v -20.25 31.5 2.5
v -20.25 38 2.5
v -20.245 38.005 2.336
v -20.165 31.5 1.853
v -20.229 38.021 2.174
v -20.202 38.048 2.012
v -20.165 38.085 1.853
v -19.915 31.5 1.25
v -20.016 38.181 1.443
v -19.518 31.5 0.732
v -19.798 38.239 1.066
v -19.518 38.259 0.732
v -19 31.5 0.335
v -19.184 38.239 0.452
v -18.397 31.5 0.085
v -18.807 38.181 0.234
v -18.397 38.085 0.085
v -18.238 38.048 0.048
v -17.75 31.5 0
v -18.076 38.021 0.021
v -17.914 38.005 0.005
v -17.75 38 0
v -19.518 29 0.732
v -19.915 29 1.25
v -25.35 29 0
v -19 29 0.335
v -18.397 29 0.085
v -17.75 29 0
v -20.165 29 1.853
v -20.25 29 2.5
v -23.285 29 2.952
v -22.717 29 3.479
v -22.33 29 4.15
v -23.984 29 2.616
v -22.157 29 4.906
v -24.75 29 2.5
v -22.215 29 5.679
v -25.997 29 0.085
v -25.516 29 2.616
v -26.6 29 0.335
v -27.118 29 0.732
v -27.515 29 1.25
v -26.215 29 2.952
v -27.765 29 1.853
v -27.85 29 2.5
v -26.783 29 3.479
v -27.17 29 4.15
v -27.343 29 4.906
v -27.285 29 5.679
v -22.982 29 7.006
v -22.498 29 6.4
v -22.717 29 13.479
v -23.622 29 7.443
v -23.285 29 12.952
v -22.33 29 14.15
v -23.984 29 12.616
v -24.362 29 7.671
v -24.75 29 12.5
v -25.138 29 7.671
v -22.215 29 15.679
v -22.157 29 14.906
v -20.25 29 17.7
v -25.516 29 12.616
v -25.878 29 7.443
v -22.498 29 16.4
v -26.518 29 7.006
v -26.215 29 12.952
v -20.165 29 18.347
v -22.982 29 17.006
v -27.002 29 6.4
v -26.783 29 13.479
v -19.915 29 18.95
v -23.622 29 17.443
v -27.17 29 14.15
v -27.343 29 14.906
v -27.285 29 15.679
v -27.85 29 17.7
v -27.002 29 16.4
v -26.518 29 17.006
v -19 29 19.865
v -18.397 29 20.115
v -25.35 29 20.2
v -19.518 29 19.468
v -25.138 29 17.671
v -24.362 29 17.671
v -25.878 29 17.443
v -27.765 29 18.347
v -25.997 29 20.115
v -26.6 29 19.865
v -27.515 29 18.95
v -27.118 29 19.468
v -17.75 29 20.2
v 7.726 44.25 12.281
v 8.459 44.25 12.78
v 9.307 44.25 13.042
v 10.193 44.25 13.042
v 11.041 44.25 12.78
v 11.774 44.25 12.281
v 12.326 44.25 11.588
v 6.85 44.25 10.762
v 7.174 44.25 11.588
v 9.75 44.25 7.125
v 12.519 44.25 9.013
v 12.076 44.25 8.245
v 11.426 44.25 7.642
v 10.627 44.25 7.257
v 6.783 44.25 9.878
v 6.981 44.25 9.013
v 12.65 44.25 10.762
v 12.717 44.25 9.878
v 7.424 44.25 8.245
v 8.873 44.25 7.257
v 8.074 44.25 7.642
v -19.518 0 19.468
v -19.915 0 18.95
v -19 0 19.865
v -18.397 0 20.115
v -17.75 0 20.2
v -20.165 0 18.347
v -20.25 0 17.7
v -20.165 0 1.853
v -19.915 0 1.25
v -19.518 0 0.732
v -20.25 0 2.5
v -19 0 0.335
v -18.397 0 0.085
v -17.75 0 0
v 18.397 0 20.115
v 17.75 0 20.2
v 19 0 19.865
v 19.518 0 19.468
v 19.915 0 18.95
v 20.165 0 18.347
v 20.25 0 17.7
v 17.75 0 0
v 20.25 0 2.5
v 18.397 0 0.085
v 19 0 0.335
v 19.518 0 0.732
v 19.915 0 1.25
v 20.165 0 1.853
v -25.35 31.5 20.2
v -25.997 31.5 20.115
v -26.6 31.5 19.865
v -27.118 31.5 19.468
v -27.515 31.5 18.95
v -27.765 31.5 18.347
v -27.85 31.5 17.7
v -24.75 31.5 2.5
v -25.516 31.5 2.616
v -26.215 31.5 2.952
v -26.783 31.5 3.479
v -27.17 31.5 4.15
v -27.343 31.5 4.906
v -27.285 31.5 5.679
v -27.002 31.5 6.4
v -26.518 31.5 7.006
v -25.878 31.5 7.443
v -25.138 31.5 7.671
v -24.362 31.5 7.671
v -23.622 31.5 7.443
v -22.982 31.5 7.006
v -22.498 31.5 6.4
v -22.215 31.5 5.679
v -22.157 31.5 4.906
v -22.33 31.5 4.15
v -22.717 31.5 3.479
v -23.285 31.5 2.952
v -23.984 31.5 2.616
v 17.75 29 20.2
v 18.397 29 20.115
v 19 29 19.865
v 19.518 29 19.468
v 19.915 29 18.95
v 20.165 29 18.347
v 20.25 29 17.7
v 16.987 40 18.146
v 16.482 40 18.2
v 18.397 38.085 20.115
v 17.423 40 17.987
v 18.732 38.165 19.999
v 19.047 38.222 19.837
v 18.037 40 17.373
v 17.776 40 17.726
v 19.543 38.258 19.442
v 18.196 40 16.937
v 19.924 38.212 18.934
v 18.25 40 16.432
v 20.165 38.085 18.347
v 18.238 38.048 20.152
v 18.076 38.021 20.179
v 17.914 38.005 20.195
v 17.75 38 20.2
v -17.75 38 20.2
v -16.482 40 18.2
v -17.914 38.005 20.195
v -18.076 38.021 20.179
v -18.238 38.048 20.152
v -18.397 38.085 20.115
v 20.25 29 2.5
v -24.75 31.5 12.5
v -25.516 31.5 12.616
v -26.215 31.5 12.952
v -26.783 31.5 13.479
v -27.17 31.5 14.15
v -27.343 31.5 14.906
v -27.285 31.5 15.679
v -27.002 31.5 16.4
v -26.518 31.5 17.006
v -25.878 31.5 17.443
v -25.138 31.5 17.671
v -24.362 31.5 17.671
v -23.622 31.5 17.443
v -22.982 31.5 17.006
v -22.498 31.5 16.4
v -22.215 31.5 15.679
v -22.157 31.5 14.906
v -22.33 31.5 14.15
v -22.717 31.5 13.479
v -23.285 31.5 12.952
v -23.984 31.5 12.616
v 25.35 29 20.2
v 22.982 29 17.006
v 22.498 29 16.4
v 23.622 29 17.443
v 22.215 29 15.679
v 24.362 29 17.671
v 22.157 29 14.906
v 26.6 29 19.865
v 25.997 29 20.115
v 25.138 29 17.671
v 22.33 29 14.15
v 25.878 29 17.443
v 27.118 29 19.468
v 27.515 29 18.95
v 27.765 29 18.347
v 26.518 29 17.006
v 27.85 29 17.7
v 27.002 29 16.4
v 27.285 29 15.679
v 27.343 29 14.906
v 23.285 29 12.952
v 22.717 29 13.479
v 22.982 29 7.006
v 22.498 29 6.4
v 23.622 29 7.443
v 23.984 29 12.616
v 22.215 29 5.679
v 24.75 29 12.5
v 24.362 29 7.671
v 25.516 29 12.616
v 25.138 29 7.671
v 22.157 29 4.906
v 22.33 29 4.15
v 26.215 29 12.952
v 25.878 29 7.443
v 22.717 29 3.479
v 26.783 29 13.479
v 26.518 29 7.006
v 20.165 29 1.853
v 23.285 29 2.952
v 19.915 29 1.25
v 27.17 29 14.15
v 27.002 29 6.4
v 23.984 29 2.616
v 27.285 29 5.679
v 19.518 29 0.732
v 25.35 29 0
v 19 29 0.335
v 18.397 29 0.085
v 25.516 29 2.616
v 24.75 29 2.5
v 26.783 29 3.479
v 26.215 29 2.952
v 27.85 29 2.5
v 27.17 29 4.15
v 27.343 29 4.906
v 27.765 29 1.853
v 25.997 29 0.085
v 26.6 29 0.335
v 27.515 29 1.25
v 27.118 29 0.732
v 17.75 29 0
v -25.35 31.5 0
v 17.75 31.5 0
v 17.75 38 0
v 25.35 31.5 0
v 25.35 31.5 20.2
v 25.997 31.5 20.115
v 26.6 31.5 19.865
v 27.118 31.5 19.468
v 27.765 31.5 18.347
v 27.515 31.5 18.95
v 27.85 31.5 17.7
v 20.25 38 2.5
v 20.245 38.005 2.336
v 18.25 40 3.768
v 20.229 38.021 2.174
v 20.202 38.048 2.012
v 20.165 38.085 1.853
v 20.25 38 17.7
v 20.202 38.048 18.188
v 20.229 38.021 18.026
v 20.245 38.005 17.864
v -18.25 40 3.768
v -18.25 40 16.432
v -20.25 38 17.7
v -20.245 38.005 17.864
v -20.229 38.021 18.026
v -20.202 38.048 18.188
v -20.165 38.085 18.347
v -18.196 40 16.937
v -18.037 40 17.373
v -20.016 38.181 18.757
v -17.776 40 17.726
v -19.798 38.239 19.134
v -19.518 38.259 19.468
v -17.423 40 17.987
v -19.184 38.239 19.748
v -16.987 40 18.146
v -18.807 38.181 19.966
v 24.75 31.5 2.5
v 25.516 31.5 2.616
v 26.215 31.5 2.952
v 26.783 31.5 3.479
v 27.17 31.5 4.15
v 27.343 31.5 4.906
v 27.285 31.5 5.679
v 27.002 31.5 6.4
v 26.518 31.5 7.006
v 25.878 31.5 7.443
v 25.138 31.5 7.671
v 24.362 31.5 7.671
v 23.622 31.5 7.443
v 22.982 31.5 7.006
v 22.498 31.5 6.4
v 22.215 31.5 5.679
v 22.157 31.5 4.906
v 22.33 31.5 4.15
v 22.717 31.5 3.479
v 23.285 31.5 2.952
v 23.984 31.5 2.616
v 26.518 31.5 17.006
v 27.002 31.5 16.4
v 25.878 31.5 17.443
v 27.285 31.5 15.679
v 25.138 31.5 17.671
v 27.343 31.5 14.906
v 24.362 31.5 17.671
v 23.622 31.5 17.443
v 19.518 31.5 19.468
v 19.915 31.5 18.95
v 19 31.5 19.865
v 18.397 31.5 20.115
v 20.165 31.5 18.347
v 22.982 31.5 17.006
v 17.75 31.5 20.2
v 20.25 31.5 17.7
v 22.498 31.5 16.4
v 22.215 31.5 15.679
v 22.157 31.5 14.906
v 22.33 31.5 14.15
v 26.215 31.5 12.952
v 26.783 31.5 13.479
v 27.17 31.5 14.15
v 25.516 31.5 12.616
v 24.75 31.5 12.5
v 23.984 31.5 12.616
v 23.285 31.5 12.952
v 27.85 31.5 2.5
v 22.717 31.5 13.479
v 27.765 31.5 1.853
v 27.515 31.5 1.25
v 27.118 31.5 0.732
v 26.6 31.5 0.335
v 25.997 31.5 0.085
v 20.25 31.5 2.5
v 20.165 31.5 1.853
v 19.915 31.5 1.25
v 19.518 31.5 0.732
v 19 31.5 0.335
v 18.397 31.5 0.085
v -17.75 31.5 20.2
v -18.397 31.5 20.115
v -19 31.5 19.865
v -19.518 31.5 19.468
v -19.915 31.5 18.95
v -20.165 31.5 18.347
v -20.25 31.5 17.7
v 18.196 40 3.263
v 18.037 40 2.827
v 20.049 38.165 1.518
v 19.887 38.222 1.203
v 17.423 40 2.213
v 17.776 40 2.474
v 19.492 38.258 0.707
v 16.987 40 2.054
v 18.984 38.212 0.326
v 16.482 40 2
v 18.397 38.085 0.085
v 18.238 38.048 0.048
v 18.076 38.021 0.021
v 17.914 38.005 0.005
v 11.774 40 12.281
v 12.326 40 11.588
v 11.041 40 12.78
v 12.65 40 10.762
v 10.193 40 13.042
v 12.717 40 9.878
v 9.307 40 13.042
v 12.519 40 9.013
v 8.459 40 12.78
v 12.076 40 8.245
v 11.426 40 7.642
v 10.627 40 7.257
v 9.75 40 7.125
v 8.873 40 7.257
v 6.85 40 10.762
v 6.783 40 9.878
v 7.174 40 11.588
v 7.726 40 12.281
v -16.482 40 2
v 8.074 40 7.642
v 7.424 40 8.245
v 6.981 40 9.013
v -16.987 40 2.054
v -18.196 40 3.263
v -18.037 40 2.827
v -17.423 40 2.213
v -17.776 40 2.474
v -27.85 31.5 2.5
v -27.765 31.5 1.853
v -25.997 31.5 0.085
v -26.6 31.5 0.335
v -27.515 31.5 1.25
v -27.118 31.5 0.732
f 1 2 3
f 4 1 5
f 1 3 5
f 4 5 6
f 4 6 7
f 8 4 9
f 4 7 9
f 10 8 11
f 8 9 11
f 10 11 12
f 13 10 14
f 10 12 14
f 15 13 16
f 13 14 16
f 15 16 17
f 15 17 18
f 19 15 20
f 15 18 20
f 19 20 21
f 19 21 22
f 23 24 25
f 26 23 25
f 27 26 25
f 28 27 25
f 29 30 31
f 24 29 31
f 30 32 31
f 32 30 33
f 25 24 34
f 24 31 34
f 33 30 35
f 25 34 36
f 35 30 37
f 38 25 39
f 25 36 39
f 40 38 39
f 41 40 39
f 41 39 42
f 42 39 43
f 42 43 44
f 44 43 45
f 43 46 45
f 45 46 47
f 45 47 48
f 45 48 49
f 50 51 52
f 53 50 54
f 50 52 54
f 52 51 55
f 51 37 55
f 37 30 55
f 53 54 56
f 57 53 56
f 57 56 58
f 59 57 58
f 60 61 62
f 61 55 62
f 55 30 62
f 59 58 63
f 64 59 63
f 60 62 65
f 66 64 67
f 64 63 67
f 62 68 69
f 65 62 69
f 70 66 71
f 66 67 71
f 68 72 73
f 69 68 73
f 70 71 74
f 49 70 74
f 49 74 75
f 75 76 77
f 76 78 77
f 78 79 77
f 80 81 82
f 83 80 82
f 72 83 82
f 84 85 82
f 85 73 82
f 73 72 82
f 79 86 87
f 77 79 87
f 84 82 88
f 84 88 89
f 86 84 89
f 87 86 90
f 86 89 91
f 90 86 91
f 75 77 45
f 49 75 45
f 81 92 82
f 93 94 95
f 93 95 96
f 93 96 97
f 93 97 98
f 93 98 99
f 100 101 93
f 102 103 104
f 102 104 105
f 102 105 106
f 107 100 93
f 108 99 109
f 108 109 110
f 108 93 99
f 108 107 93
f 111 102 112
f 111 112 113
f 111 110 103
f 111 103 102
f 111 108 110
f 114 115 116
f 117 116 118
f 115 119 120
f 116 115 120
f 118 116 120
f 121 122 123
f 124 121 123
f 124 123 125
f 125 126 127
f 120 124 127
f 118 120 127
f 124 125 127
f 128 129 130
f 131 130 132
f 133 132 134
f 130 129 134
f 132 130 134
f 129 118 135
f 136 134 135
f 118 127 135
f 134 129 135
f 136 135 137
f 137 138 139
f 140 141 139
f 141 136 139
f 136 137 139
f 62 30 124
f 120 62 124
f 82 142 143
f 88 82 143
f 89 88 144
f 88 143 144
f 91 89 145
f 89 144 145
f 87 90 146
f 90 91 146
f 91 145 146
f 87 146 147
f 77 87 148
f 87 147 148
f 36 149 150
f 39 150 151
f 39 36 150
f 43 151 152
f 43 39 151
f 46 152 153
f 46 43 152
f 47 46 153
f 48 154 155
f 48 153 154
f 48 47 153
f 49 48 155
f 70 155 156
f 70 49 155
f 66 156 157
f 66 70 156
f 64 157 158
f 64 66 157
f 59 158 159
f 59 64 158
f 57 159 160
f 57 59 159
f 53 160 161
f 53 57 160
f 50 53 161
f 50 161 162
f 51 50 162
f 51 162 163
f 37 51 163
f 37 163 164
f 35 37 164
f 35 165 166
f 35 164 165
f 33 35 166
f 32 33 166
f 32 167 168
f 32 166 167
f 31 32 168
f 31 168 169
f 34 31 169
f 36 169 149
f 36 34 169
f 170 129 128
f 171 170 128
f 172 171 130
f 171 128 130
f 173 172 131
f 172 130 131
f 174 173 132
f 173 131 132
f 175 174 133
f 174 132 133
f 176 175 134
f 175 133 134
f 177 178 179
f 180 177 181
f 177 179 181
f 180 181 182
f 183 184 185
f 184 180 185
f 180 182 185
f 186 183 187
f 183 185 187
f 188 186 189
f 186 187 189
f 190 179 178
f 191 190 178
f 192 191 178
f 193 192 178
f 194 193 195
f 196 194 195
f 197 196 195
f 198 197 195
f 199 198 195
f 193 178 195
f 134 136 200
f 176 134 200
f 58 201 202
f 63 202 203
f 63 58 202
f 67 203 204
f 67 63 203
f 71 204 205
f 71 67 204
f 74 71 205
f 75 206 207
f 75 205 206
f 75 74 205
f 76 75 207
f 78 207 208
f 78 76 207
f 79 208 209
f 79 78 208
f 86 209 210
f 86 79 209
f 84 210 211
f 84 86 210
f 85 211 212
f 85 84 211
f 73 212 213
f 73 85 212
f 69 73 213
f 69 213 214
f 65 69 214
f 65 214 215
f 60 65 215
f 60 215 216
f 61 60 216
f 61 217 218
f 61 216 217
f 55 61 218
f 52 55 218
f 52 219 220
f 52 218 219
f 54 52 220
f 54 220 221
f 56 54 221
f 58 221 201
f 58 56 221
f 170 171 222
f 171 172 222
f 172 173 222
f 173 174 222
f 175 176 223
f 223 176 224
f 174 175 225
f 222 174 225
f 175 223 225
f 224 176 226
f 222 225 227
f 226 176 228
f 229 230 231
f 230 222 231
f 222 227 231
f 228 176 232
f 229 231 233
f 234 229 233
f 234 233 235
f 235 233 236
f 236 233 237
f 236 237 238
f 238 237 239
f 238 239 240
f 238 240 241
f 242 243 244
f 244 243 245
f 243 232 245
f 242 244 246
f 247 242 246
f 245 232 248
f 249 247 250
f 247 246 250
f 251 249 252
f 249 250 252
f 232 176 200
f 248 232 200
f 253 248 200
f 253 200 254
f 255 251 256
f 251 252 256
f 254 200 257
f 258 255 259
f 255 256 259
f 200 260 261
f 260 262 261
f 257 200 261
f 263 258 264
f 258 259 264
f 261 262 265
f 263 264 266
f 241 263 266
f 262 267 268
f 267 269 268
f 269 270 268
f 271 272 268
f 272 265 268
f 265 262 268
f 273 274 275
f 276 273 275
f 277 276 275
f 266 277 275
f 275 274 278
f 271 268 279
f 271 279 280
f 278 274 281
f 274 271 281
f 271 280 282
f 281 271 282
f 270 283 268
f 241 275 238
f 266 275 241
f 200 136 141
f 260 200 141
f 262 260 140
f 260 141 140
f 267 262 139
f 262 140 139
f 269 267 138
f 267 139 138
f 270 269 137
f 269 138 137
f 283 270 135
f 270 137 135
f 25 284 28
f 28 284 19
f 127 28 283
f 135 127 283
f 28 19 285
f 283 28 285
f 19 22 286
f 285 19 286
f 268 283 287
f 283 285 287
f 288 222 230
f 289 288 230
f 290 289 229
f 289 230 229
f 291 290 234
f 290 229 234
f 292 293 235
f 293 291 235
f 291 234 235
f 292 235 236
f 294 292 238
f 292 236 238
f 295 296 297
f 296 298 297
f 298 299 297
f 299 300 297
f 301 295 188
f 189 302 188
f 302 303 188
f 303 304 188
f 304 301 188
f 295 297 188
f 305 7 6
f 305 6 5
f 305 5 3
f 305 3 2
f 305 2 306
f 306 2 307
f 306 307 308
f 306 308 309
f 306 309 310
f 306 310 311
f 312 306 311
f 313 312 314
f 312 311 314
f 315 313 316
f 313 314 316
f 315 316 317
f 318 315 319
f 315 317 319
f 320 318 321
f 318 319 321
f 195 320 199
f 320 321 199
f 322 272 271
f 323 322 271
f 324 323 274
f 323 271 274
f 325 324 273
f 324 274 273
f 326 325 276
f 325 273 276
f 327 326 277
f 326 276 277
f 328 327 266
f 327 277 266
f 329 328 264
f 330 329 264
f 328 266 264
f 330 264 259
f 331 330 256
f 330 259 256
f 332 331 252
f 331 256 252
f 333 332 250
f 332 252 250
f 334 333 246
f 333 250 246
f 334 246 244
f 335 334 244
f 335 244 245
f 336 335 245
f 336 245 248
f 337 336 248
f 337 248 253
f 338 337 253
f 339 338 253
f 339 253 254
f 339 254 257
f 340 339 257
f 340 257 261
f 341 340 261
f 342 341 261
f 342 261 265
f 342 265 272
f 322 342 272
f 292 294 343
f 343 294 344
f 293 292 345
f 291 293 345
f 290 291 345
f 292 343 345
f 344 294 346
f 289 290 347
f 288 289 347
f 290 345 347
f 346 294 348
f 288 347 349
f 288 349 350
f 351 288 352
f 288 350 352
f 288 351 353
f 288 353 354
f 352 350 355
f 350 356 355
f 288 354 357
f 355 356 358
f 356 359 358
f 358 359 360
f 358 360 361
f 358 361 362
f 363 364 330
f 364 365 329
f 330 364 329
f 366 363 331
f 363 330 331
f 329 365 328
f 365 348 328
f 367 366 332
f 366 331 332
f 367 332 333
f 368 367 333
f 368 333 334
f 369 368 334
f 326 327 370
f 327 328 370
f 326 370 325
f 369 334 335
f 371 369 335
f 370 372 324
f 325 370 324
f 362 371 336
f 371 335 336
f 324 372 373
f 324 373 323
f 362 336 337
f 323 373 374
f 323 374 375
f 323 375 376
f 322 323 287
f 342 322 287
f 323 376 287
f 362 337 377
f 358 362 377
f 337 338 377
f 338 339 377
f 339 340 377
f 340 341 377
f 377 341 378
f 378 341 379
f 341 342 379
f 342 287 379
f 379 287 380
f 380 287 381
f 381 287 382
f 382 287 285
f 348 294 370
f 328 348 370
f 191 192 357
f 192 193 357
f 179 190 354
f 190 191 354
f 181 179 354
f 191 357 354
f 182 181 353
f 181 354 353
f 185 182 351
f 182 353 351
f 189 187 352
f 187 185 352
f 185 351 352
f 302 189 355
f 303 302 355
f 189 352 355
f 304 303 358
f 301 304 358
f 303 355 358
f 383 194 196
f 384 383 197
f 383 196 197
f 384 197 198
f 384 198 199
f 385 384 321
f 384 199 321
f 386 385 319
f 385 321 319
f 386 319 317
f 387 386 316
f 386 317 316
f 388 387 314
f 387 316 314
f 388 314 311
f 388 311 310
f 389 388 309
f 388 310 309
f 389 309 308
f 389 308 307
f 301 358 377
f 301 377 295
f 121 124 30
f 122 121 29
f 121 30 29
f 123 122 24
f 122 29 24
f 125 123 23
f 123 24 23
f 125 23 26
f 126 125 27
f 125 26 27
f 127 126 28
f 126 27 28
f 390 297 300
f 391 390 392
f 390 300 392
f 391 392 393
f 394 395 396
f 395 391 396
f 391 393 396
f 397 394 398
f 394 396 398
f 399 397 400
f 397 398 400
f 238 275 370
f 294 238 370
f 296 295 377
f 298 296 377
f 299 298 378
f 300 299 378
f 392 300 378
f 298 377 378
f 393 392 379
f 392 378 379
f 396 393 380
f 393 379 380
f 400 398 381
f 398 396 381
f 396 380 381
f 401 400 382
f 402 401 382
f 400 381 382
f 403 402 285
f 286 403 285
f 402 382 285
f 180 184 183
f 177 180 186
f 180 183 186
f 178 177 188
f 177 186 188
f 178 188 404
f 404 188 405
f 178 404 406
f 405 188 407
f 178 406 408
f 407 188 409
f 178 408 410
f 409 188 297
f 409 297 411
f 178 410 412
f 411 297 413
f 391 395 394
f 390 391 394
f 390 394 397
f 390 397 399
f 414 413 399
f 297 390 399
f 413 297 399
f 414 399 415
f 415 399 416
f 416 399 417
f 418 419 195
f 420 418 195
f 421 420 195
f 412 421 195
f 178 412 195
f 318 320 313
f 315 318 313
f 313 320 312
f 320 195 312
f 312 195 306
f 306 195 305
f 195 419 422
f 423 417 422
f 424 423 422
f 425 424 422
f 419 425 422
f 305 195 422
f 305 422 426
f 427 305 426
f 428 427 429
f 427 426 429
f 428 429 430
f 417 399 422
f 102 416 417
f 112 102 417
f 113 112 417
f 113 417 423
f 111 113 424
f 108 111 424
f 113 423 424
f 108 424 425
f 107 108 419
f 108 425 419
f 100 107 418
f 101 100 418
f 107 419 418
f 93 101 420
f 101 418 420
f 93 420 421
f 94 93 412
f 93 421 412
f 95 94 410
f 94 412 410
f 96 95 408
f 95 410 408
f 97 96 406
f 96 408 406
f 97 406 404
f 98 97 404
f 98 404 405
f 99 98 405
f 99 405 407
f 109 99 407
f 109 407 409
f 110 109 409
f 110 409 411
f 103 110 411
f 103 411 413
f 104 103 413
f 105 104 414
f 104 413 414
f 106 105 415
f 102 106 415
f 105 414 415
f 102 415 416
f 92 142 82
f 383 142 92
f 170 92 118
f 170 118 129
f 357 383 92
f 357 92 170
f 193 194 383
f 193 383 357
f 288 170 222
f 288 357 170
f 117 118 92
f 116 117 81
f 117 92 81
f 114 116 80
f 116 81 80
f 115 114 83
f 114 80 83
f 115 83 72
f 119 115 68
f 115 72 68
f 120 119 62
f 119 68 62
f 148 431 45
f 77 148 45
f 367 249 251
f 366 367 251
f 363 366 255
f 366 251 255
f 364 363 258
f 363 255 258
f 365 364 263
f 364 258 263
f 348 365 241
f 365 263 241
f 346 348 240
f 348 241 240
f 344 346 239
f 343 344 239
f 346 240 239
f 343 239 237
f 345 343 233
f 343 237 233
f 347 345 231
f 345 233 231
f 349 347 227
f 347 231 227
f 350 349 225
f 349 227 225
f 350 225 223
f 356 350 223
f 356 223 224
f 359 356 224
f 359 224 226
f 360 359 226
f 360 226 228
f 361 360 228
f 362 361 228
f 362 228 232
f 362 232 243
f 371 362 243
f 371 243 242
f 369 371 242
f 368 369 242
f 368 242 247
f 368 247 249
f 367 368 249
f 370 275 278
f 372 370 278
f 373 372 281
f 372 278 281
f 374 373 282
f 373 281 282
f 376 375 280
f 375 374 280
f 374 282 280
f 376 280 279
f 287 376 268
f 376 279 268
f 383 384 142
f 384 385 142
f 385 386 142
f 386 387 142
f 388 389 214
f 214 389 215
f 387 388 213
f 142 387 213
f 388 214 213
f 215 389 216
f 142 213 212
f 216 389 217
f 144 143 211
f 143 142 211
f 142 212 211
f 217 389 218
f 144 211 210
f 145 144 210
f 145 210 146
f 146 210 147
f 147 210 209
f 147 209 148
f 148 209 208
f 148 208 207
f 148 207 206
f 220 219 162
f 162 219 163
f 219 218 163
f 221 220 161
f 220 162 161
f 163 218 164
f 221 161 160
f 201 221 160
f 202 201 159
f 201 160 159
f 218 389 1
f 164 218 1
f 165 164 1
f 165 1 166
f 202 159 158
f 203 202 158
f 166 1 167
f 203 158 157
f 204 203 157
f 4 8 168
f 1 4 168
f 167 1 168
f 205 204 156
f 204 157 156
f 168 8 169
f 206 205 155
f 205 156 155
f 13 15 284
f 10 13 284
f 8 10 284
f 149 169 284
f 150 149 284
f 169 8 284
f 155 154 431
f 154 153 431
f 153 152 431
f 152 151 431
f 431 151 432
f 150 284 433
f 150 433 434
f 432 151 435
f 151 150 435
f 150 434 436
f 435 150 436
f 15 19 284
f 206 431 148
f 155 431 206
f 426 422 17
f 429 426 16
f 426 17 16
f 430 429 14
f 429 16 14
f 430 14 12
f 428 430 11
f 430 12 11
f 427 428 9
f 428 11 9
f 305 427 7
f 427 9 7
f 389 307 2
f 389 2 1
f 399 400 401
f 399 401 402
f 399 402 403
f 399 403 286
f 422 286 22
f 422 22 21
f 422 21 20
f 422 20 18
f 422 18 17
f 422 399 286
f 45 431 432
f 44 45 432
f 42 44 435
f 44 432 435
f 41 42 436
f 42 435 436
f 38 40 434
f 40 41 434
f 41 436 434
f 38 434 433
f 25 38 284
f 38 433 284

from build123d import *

# Parameters (mm, degrees)
BOSS_EXTRUDE1_DEPTH = 20.2
SKETCH2_R           = 2.975
BOSS_EXTRUDE2_DEPTH = 4.25
CUT_EXTRUDE1_START  = 29
SKETCH3_R           = 2.6
CUT_EXTRUDE1_DEPTH  = 4.25
CHAMFER1_SIZE       = 2
FILLET1_R           = 2.5


with BuildPart() as part:
    # Sketch1 → Boss-Extrude1 (new body)
    with BuildSketch(Plane.XY):
        Polygon((-20.25, 0), (20.25, 0), (20.25, 29), (27.85, 29), (27.85, 31.5), (20.25, 31.5), (20.25, 40), (-20.25, 40), (-20.25, 31.5), (-27.85, 31.5), (-27.85, 29), (-20.25, 29), align=None)
    extrude(amount=BOSS_EXTRUDE1_DEPTH)

    # Sketch2 → Boss-Extrude2 (add)
    with BuildSketch(Plane(origin=(0, 40, 0), x_dir=(1, 0, 0), z_dir=(0, 1, 0))):
        with Locations(Location((9.75, -10.1, 0), (0, 0, 90))):
            Circle(SKETCH2_R)
    extrude(amount=BOSS_EXTRUDE2_DEPTH)

    # Sketch3 → Cut-Extrude1 (cut)
    with BuildSketch(Plane(origin=(0, 0, 0), x_dir=(1, 0, 0), z_dir=(0, 1, 0)).offset(CUT_EXTRUDE1_START)):
        with Locations(Location((-24.75, -5.1, 0), (0, 0, 90))):
            Circle(SKETCH3_R)
        with Locations(Location((-24.75, -15.1, 0), (0, 0, 90))):
            Circle(SKETCH3_R)
    cut_extrude1 = extrude(amount=CUT_EXTRUDE1_DEPTH, mode=Mode.SUBTRACT)

    # Mirror1: Cut-Extrude1 across plane
    add(cut_extrude1.mirror(Plane(origin=(0, 0, 0), x_dir=(0, 0, 1), z_dir=(1, 0, 0))), mode=Mode.SUBTRACT)

    # Chamfer1
    chamfer1_edges = [part.edges().sort_by_distance(p)[0] for p in [
        (0, 40, 0),
        (0, 40, 20.2),
        (-20.25, 40, 10.1),
        (20.25, 40, 10.1),
    ]]
    chamfer(chamfer1_edges, length=CHAMFER1_SIZE)

    # Fillet1
    # the kernel refuses this fillet: 2.5 mm, written as the material it takes off along each edge
    with BuildSketch(Plane(origin=(20.25, -6.25, 0), x_dir=(-1, 0, 0), z_dir=(0, 1, 0)), Plane(origin=(-20.25, 29, 0), x_dir=(1, 0, 0), z_dir=(0, -1, 0)), Plane(origin=(-20.25, 29, 20.2), x_dir=(0, 0, -1), z_dir=(0, -1, 0)), Plane(origin=(20.25, -6.25, 20.2), x_dir=(0, 0, -1), z_dir=(0, 1, 0))) as fillet1_piece_1:
        with BuildLine():
            CenterArc((FILLET1_R, FILLET1_R), FILLET1_R, 180, 90)
            Line((0, FILLET1_R), (0, 0))
            Line((0, 0), (FILLET1_R, 0))
        make_face()
    extrude(amount=35.25, mode=Mode.SUBTRACT)
    with BuildSketch(Plane(origin=(20.25, -6.25, 0), x_dir=(-1, 0, 0), z_dir=(0, 1, 0))) as fillet1_piece_2_section:
        with BuildLine():
            CenterArc((FILLET1_R, FILLET1_R), FILLET1_R, 180, 90)
            Line((0, FILLET1_R), (0, 0))
            Line((0, 0), (FILLET1_R, 0))
        make_face()
    fillet1_piece_2 = extrude(amount=41.5, mode=Mode.PRIVATE)
    fillet1_piece_2 = split(fillet1_piece_2, bisect_by=Plane(origin=(19.684012214, 31.5, 0.565987786), z_dir=(0, 1, 0)), keep=Keep.TOP, mode=Mode.PRIVATE)
    add(fillet1_piece_2, mode=Mode.SUBTRACT)
    with BuildSketch(Plane(origin=(-20.25, 35.25, 0), x_dir=(1, 0, 0), z_dir=(0, -1, 0))) as fillet1_piece_3_section:
        with BuildLine():
            CenterArc((FILLET1_R, FILLET1_R), FILLET1_R, 180, 90)
            Line((0, FILLET1_R), (0, 0))
            Line((0, 0), (FILLET1_R, 0))
        make_face()
    fillet1_piece_3 = extrude(amount=41.5, mode=Mode.PRIVATE)
    fillet1_piece_3 = split(fillet1_piece_3, bisect_by=Plane(origin=(-19.684012214, 31.5, 0.565987786), z_dir=(0, 1, 0)), keep=Keep.TOP, mode=Mode.PRIVATE)
    add(fillet1_piece_3, mode=Mode.SUBTRACT)
    with BuildSketch(Plane(origin=(-27.85, 37.75, 0), x_dir=(1, 0, 0), z_dir=(0, -1, 0)), Plane(origin=(27.85, 22.75, 0), x_dir=(-1, 0, 0), z_dir=(0, 1, 0)), Plane(origin=(-27.85, 37.75, 20.2), x_dir=(0, 0, -1), z_dir=(0, -1, 0)), Plane(origin=(27.85, 22.75, 20.2), x_dir=(0, 0, -1), z_dir=(0, 1, 0))) as fillet1_piece_4:
        with BuildLine():
            CenterArc((FILLET1_R, FILLET1_R), FILLET1_R, 180, 90)
            Line((0, FILLET1_R), (0, 0))
            Line((0, 0), (FILLET1_R, 0))
        make_face()
    extrude(amount=15, mode=Mode.SUBTRACT)
    with BuildSketch(Plane(origin=(20.25, 25.25, 0), x_dir=(-1, 0, 0), z_dir=(0, 1, 0))) as fillet1_piece_5_section:
        with BuildLine():
            CenterArc((FILLET1_R, FILLET1_R), FILLET1_R, 180, 90)
            Line((0, FILLET1_R), (0, 0))
            Line((0, 0), (FILLET1_R, 0))
        make_face()
    fillet1_piece_5 = extrude(amount=19, mode=Mode.PRIVATE)
    fillet1_piece_5 = split(fillet1_piece_5, bisect_by=Plane(origin=(19.684012214, 29, 0.565987786), z_dir=(0, -1, 0)), keep=Keep.TOP, mode=Mode.PRIVATE)
    add(fillet1_piece_5, mode=Mode.SUBTRACT)
    with BuildSketch(Plane(origin=(20.25, 31.5, 0), x_dir=(-1, 0, 0), z_dir=(0, 1, 0)), Plane(origin=(20.25, 31.5, 20.2), x_dir=(0, 0, -1), z_dir=(0, 1, 0)), Plane(origin=(-20.25, 44.25, 20.2), x_dir=(0, 0, -1), z_dir=(0, -1, 0)), Plane(origin=(-20.25, 44.25, 0), x_dir=(1, 0, 0), z_dir=(0, -1, 0))) as fillet1_piece_6:
        with BuildLine():
            CenterArc((FILLET1_R, FILLET1_R), FILLET1_R, 180, 90)
            Line((0, FILLET1_R), (0, 0))
            Line((0, 0), (FILLET1_R, 0))
        make_face()
    extrude(amount=12.75, mode=Mode.SUBTRACT)
    with BuildSketch(Plane(origin=(20.25, 25.25, 20.2), x_dir=(0, 0, -1), z_dir=(0, 1, 0))) as fillet1_piece_7_section:
        with BuildLine():
            CenterArc((FILLET1_R, FILLET1_R), FILLET1_R, 180, 90)
            Line((0, FILLET1_R), (0, 0))
            Line((0, 0), (FILLET1_R, 0))
        make_face()
    fillet1_piece_7 = extrude(amount=19, mode=Mode.PRIVATE)
    fillet1_piece_7 = split(fillet1_piece_7, bisect_by=Plane(origin=(19.684012214, 29, 19.634012214), z_dir=(0, -1, 0)), keep=Keep.TOP, mode=Mode.PRIVATE)
    add(fillet1_piece_7, mode=Mode.SUBTRACT)
    with BuildSketch(Plane(origin=(-20.25, 35.25, 20.2), x_dir=(0, 0, -1), z_dir=(0, -1, 0))) as fillet1_piece_8_section:
        with BuildLine():
            CenterArc((FILLET1_R, FILLET1_R), FILLET1_R, 180, 90)
            Line((0, FILLET1_R), (0, 0))
            Line((0, 0), (FILLET1_R, 0))
        make_face()
    fillet1_piece_8 = extrude(amount=41.5, mode=Mode.PRIVATE)
    fillet1_piece_8 = split(fillet1_piece_8, bisect_by=Plane(origin=(-19.684012214, 31.5, 19.634012214), z_dir=(0, 1, 0)), keep=Keep.TOP, mode=Mode.PRIVATE)
    add(fillet1_piece_8, mode=Mode.SUBTRACT)
    with BuildSketch(Plane(origin=(20.25, -6.25, 20.2), x_dir=(0, 0, -1), z_dir=(0, 1, 0))) as fillet1_piece_9_section:
        with BuildLine():
            CenterArc((FILLET1_R, FILLET1_R), FILLET1_R, 180, 90)
            Line((0, FILLET1_R), (0, 0))
            Line((0, 0), (FILLET1_R, 0))
        make_face()
    fillet1_piece_9 = extrude(amount=41.5, mode=Mode.PRIVATE)
    fillet1_piece_9 = split(fillet1_piece_9, bisect_by=Plane(origin=(19.684012214, 31.5, 19.634012214), z_dir=(0, 1, 0)), keep=Keep.TOP, mode=Mode.PRIVATE)
    add(fillet1_piece_9, mode=Mode.SUBTRACT)
    with BuildSketch(Plane(origin=(-20.25, 44.25, 20.2), x_dir=(0, 0, -1), z_dir=(0, -1, 0))) as fillet1_piece_10_section:
        with BuildLine():
            CenterArc((FILLET1_R, FILLET1_R), FILLET1_R, 180, 90)
            Line((0, FILLET1_R), (0, 0))
            Line((0, 0), (FILLET1_R, 0))
        make_face()
    fillet1_piece_10 = extrude(amount=19, mode=Mode.PRIVATE)
    fillet1_piece_10 = split(fillet1_piece_10, bisect_by=Plane(origin=(-19.684012214, 29, 19.634012214), z_dir=(0, -1, 0)), keep=Keep.TOP, mode=Mode.PRIVATE)
    add(fillet1_piece_10, mode=Mode.SUBTRACT)
    with BuildSketch(Plane(origin=(-20.25, 44.25, 0), x_dir=(1, 0, 0), z_dir=(0, -1, 0))) as fillet1_piece_11_section:
        with BuildLine():
            CenterArc((FILLET1_R, FILLET1_R), FILLET1_R, 180, 90)
            Line((0, FILLET1_R), (0, 0))
            Line((0, 0), (FILLET1_R, 0))
        make_face()
    fillet1_piece_11 = extrude(amount=19, mode=Mode.PRIVATE)
    fillet1_piece_11 = split(fillet1_piece_11, bisect_by=Plane(origin=(-19.684012214, 29, 0.565987786), z_dir=(0, -1, 0)), keep=Keep.TOP, mode=Mode.PRIVATE)
    add(fillet1_piece_11, mode=Mode.SUBTRACT)
    with BuildSketch(Plane(origin=(22.333333333, 35.916666667, -2.083333333), x_dir=(-0.816496580927726, -0.4082482904638627, -0.4082482904638633), z_dir=(-0.5773502691896258, 0.5773502691896258, 0.5773502691896258)), Plane(origin=(22.333333333, 35.916666667, 22.283333333), x_dir=(0.40824829046386174, -0.4082482904638642, -0.8164965809277261), z_dir=(-0.5773502691896258, 0.5773502691896258, -0.5773502691896258))) as fillet1_piece_12:
        with BuildLine():
            CenterArc((FILLET1_R * 0.57735026919, FILLET1_R), FILLET1_R, 210, 60)
            Line((-FILLET1_R * 0.288675134595, FILLET1_R * 0.5), (0, 0))
            Line((0, 0), (FILLET1_R * 0.57735026919, 0))
        make_face()
    extrude(amount=10.68097998, mode=Mode.SUBTRACT)
    with BuildSketch(Plane(origin=(-22.333333333, 35.916666667, -2.083333333), x_dir=(0.8164965809277259, -0.4082482904638622, -0.40824829046386374), z_dir=(0.5773502691896258, 0.5773502691896258, 0.5773502691896258)), Plane(origin=(-22.333333333, 35.916666667, 22.283333333), x_dir=(-0.40824829046386424, -0.4082482904638618, -0.816496580927726), z_dir=(0.5773502691896258, 0.5773502691896258, -0.5773502691896258))) as fillet1_piece_13:
        with BuildLine():
            CenterArc((FILLET1_R * 0.57735026919, -FILLET1_R), FILLET1_R, 90, 60)
            Line((-FILLET1_R * 0.288675134595, -FILLET1_R * 0.5), (0, 0))
            Line((0, 0), (FILLET1_R * 0.57735026919, 0))
        make_face()
    extrude(amount=10.68097998, mode=Mode.SUBTRACT)


solid = part.part
